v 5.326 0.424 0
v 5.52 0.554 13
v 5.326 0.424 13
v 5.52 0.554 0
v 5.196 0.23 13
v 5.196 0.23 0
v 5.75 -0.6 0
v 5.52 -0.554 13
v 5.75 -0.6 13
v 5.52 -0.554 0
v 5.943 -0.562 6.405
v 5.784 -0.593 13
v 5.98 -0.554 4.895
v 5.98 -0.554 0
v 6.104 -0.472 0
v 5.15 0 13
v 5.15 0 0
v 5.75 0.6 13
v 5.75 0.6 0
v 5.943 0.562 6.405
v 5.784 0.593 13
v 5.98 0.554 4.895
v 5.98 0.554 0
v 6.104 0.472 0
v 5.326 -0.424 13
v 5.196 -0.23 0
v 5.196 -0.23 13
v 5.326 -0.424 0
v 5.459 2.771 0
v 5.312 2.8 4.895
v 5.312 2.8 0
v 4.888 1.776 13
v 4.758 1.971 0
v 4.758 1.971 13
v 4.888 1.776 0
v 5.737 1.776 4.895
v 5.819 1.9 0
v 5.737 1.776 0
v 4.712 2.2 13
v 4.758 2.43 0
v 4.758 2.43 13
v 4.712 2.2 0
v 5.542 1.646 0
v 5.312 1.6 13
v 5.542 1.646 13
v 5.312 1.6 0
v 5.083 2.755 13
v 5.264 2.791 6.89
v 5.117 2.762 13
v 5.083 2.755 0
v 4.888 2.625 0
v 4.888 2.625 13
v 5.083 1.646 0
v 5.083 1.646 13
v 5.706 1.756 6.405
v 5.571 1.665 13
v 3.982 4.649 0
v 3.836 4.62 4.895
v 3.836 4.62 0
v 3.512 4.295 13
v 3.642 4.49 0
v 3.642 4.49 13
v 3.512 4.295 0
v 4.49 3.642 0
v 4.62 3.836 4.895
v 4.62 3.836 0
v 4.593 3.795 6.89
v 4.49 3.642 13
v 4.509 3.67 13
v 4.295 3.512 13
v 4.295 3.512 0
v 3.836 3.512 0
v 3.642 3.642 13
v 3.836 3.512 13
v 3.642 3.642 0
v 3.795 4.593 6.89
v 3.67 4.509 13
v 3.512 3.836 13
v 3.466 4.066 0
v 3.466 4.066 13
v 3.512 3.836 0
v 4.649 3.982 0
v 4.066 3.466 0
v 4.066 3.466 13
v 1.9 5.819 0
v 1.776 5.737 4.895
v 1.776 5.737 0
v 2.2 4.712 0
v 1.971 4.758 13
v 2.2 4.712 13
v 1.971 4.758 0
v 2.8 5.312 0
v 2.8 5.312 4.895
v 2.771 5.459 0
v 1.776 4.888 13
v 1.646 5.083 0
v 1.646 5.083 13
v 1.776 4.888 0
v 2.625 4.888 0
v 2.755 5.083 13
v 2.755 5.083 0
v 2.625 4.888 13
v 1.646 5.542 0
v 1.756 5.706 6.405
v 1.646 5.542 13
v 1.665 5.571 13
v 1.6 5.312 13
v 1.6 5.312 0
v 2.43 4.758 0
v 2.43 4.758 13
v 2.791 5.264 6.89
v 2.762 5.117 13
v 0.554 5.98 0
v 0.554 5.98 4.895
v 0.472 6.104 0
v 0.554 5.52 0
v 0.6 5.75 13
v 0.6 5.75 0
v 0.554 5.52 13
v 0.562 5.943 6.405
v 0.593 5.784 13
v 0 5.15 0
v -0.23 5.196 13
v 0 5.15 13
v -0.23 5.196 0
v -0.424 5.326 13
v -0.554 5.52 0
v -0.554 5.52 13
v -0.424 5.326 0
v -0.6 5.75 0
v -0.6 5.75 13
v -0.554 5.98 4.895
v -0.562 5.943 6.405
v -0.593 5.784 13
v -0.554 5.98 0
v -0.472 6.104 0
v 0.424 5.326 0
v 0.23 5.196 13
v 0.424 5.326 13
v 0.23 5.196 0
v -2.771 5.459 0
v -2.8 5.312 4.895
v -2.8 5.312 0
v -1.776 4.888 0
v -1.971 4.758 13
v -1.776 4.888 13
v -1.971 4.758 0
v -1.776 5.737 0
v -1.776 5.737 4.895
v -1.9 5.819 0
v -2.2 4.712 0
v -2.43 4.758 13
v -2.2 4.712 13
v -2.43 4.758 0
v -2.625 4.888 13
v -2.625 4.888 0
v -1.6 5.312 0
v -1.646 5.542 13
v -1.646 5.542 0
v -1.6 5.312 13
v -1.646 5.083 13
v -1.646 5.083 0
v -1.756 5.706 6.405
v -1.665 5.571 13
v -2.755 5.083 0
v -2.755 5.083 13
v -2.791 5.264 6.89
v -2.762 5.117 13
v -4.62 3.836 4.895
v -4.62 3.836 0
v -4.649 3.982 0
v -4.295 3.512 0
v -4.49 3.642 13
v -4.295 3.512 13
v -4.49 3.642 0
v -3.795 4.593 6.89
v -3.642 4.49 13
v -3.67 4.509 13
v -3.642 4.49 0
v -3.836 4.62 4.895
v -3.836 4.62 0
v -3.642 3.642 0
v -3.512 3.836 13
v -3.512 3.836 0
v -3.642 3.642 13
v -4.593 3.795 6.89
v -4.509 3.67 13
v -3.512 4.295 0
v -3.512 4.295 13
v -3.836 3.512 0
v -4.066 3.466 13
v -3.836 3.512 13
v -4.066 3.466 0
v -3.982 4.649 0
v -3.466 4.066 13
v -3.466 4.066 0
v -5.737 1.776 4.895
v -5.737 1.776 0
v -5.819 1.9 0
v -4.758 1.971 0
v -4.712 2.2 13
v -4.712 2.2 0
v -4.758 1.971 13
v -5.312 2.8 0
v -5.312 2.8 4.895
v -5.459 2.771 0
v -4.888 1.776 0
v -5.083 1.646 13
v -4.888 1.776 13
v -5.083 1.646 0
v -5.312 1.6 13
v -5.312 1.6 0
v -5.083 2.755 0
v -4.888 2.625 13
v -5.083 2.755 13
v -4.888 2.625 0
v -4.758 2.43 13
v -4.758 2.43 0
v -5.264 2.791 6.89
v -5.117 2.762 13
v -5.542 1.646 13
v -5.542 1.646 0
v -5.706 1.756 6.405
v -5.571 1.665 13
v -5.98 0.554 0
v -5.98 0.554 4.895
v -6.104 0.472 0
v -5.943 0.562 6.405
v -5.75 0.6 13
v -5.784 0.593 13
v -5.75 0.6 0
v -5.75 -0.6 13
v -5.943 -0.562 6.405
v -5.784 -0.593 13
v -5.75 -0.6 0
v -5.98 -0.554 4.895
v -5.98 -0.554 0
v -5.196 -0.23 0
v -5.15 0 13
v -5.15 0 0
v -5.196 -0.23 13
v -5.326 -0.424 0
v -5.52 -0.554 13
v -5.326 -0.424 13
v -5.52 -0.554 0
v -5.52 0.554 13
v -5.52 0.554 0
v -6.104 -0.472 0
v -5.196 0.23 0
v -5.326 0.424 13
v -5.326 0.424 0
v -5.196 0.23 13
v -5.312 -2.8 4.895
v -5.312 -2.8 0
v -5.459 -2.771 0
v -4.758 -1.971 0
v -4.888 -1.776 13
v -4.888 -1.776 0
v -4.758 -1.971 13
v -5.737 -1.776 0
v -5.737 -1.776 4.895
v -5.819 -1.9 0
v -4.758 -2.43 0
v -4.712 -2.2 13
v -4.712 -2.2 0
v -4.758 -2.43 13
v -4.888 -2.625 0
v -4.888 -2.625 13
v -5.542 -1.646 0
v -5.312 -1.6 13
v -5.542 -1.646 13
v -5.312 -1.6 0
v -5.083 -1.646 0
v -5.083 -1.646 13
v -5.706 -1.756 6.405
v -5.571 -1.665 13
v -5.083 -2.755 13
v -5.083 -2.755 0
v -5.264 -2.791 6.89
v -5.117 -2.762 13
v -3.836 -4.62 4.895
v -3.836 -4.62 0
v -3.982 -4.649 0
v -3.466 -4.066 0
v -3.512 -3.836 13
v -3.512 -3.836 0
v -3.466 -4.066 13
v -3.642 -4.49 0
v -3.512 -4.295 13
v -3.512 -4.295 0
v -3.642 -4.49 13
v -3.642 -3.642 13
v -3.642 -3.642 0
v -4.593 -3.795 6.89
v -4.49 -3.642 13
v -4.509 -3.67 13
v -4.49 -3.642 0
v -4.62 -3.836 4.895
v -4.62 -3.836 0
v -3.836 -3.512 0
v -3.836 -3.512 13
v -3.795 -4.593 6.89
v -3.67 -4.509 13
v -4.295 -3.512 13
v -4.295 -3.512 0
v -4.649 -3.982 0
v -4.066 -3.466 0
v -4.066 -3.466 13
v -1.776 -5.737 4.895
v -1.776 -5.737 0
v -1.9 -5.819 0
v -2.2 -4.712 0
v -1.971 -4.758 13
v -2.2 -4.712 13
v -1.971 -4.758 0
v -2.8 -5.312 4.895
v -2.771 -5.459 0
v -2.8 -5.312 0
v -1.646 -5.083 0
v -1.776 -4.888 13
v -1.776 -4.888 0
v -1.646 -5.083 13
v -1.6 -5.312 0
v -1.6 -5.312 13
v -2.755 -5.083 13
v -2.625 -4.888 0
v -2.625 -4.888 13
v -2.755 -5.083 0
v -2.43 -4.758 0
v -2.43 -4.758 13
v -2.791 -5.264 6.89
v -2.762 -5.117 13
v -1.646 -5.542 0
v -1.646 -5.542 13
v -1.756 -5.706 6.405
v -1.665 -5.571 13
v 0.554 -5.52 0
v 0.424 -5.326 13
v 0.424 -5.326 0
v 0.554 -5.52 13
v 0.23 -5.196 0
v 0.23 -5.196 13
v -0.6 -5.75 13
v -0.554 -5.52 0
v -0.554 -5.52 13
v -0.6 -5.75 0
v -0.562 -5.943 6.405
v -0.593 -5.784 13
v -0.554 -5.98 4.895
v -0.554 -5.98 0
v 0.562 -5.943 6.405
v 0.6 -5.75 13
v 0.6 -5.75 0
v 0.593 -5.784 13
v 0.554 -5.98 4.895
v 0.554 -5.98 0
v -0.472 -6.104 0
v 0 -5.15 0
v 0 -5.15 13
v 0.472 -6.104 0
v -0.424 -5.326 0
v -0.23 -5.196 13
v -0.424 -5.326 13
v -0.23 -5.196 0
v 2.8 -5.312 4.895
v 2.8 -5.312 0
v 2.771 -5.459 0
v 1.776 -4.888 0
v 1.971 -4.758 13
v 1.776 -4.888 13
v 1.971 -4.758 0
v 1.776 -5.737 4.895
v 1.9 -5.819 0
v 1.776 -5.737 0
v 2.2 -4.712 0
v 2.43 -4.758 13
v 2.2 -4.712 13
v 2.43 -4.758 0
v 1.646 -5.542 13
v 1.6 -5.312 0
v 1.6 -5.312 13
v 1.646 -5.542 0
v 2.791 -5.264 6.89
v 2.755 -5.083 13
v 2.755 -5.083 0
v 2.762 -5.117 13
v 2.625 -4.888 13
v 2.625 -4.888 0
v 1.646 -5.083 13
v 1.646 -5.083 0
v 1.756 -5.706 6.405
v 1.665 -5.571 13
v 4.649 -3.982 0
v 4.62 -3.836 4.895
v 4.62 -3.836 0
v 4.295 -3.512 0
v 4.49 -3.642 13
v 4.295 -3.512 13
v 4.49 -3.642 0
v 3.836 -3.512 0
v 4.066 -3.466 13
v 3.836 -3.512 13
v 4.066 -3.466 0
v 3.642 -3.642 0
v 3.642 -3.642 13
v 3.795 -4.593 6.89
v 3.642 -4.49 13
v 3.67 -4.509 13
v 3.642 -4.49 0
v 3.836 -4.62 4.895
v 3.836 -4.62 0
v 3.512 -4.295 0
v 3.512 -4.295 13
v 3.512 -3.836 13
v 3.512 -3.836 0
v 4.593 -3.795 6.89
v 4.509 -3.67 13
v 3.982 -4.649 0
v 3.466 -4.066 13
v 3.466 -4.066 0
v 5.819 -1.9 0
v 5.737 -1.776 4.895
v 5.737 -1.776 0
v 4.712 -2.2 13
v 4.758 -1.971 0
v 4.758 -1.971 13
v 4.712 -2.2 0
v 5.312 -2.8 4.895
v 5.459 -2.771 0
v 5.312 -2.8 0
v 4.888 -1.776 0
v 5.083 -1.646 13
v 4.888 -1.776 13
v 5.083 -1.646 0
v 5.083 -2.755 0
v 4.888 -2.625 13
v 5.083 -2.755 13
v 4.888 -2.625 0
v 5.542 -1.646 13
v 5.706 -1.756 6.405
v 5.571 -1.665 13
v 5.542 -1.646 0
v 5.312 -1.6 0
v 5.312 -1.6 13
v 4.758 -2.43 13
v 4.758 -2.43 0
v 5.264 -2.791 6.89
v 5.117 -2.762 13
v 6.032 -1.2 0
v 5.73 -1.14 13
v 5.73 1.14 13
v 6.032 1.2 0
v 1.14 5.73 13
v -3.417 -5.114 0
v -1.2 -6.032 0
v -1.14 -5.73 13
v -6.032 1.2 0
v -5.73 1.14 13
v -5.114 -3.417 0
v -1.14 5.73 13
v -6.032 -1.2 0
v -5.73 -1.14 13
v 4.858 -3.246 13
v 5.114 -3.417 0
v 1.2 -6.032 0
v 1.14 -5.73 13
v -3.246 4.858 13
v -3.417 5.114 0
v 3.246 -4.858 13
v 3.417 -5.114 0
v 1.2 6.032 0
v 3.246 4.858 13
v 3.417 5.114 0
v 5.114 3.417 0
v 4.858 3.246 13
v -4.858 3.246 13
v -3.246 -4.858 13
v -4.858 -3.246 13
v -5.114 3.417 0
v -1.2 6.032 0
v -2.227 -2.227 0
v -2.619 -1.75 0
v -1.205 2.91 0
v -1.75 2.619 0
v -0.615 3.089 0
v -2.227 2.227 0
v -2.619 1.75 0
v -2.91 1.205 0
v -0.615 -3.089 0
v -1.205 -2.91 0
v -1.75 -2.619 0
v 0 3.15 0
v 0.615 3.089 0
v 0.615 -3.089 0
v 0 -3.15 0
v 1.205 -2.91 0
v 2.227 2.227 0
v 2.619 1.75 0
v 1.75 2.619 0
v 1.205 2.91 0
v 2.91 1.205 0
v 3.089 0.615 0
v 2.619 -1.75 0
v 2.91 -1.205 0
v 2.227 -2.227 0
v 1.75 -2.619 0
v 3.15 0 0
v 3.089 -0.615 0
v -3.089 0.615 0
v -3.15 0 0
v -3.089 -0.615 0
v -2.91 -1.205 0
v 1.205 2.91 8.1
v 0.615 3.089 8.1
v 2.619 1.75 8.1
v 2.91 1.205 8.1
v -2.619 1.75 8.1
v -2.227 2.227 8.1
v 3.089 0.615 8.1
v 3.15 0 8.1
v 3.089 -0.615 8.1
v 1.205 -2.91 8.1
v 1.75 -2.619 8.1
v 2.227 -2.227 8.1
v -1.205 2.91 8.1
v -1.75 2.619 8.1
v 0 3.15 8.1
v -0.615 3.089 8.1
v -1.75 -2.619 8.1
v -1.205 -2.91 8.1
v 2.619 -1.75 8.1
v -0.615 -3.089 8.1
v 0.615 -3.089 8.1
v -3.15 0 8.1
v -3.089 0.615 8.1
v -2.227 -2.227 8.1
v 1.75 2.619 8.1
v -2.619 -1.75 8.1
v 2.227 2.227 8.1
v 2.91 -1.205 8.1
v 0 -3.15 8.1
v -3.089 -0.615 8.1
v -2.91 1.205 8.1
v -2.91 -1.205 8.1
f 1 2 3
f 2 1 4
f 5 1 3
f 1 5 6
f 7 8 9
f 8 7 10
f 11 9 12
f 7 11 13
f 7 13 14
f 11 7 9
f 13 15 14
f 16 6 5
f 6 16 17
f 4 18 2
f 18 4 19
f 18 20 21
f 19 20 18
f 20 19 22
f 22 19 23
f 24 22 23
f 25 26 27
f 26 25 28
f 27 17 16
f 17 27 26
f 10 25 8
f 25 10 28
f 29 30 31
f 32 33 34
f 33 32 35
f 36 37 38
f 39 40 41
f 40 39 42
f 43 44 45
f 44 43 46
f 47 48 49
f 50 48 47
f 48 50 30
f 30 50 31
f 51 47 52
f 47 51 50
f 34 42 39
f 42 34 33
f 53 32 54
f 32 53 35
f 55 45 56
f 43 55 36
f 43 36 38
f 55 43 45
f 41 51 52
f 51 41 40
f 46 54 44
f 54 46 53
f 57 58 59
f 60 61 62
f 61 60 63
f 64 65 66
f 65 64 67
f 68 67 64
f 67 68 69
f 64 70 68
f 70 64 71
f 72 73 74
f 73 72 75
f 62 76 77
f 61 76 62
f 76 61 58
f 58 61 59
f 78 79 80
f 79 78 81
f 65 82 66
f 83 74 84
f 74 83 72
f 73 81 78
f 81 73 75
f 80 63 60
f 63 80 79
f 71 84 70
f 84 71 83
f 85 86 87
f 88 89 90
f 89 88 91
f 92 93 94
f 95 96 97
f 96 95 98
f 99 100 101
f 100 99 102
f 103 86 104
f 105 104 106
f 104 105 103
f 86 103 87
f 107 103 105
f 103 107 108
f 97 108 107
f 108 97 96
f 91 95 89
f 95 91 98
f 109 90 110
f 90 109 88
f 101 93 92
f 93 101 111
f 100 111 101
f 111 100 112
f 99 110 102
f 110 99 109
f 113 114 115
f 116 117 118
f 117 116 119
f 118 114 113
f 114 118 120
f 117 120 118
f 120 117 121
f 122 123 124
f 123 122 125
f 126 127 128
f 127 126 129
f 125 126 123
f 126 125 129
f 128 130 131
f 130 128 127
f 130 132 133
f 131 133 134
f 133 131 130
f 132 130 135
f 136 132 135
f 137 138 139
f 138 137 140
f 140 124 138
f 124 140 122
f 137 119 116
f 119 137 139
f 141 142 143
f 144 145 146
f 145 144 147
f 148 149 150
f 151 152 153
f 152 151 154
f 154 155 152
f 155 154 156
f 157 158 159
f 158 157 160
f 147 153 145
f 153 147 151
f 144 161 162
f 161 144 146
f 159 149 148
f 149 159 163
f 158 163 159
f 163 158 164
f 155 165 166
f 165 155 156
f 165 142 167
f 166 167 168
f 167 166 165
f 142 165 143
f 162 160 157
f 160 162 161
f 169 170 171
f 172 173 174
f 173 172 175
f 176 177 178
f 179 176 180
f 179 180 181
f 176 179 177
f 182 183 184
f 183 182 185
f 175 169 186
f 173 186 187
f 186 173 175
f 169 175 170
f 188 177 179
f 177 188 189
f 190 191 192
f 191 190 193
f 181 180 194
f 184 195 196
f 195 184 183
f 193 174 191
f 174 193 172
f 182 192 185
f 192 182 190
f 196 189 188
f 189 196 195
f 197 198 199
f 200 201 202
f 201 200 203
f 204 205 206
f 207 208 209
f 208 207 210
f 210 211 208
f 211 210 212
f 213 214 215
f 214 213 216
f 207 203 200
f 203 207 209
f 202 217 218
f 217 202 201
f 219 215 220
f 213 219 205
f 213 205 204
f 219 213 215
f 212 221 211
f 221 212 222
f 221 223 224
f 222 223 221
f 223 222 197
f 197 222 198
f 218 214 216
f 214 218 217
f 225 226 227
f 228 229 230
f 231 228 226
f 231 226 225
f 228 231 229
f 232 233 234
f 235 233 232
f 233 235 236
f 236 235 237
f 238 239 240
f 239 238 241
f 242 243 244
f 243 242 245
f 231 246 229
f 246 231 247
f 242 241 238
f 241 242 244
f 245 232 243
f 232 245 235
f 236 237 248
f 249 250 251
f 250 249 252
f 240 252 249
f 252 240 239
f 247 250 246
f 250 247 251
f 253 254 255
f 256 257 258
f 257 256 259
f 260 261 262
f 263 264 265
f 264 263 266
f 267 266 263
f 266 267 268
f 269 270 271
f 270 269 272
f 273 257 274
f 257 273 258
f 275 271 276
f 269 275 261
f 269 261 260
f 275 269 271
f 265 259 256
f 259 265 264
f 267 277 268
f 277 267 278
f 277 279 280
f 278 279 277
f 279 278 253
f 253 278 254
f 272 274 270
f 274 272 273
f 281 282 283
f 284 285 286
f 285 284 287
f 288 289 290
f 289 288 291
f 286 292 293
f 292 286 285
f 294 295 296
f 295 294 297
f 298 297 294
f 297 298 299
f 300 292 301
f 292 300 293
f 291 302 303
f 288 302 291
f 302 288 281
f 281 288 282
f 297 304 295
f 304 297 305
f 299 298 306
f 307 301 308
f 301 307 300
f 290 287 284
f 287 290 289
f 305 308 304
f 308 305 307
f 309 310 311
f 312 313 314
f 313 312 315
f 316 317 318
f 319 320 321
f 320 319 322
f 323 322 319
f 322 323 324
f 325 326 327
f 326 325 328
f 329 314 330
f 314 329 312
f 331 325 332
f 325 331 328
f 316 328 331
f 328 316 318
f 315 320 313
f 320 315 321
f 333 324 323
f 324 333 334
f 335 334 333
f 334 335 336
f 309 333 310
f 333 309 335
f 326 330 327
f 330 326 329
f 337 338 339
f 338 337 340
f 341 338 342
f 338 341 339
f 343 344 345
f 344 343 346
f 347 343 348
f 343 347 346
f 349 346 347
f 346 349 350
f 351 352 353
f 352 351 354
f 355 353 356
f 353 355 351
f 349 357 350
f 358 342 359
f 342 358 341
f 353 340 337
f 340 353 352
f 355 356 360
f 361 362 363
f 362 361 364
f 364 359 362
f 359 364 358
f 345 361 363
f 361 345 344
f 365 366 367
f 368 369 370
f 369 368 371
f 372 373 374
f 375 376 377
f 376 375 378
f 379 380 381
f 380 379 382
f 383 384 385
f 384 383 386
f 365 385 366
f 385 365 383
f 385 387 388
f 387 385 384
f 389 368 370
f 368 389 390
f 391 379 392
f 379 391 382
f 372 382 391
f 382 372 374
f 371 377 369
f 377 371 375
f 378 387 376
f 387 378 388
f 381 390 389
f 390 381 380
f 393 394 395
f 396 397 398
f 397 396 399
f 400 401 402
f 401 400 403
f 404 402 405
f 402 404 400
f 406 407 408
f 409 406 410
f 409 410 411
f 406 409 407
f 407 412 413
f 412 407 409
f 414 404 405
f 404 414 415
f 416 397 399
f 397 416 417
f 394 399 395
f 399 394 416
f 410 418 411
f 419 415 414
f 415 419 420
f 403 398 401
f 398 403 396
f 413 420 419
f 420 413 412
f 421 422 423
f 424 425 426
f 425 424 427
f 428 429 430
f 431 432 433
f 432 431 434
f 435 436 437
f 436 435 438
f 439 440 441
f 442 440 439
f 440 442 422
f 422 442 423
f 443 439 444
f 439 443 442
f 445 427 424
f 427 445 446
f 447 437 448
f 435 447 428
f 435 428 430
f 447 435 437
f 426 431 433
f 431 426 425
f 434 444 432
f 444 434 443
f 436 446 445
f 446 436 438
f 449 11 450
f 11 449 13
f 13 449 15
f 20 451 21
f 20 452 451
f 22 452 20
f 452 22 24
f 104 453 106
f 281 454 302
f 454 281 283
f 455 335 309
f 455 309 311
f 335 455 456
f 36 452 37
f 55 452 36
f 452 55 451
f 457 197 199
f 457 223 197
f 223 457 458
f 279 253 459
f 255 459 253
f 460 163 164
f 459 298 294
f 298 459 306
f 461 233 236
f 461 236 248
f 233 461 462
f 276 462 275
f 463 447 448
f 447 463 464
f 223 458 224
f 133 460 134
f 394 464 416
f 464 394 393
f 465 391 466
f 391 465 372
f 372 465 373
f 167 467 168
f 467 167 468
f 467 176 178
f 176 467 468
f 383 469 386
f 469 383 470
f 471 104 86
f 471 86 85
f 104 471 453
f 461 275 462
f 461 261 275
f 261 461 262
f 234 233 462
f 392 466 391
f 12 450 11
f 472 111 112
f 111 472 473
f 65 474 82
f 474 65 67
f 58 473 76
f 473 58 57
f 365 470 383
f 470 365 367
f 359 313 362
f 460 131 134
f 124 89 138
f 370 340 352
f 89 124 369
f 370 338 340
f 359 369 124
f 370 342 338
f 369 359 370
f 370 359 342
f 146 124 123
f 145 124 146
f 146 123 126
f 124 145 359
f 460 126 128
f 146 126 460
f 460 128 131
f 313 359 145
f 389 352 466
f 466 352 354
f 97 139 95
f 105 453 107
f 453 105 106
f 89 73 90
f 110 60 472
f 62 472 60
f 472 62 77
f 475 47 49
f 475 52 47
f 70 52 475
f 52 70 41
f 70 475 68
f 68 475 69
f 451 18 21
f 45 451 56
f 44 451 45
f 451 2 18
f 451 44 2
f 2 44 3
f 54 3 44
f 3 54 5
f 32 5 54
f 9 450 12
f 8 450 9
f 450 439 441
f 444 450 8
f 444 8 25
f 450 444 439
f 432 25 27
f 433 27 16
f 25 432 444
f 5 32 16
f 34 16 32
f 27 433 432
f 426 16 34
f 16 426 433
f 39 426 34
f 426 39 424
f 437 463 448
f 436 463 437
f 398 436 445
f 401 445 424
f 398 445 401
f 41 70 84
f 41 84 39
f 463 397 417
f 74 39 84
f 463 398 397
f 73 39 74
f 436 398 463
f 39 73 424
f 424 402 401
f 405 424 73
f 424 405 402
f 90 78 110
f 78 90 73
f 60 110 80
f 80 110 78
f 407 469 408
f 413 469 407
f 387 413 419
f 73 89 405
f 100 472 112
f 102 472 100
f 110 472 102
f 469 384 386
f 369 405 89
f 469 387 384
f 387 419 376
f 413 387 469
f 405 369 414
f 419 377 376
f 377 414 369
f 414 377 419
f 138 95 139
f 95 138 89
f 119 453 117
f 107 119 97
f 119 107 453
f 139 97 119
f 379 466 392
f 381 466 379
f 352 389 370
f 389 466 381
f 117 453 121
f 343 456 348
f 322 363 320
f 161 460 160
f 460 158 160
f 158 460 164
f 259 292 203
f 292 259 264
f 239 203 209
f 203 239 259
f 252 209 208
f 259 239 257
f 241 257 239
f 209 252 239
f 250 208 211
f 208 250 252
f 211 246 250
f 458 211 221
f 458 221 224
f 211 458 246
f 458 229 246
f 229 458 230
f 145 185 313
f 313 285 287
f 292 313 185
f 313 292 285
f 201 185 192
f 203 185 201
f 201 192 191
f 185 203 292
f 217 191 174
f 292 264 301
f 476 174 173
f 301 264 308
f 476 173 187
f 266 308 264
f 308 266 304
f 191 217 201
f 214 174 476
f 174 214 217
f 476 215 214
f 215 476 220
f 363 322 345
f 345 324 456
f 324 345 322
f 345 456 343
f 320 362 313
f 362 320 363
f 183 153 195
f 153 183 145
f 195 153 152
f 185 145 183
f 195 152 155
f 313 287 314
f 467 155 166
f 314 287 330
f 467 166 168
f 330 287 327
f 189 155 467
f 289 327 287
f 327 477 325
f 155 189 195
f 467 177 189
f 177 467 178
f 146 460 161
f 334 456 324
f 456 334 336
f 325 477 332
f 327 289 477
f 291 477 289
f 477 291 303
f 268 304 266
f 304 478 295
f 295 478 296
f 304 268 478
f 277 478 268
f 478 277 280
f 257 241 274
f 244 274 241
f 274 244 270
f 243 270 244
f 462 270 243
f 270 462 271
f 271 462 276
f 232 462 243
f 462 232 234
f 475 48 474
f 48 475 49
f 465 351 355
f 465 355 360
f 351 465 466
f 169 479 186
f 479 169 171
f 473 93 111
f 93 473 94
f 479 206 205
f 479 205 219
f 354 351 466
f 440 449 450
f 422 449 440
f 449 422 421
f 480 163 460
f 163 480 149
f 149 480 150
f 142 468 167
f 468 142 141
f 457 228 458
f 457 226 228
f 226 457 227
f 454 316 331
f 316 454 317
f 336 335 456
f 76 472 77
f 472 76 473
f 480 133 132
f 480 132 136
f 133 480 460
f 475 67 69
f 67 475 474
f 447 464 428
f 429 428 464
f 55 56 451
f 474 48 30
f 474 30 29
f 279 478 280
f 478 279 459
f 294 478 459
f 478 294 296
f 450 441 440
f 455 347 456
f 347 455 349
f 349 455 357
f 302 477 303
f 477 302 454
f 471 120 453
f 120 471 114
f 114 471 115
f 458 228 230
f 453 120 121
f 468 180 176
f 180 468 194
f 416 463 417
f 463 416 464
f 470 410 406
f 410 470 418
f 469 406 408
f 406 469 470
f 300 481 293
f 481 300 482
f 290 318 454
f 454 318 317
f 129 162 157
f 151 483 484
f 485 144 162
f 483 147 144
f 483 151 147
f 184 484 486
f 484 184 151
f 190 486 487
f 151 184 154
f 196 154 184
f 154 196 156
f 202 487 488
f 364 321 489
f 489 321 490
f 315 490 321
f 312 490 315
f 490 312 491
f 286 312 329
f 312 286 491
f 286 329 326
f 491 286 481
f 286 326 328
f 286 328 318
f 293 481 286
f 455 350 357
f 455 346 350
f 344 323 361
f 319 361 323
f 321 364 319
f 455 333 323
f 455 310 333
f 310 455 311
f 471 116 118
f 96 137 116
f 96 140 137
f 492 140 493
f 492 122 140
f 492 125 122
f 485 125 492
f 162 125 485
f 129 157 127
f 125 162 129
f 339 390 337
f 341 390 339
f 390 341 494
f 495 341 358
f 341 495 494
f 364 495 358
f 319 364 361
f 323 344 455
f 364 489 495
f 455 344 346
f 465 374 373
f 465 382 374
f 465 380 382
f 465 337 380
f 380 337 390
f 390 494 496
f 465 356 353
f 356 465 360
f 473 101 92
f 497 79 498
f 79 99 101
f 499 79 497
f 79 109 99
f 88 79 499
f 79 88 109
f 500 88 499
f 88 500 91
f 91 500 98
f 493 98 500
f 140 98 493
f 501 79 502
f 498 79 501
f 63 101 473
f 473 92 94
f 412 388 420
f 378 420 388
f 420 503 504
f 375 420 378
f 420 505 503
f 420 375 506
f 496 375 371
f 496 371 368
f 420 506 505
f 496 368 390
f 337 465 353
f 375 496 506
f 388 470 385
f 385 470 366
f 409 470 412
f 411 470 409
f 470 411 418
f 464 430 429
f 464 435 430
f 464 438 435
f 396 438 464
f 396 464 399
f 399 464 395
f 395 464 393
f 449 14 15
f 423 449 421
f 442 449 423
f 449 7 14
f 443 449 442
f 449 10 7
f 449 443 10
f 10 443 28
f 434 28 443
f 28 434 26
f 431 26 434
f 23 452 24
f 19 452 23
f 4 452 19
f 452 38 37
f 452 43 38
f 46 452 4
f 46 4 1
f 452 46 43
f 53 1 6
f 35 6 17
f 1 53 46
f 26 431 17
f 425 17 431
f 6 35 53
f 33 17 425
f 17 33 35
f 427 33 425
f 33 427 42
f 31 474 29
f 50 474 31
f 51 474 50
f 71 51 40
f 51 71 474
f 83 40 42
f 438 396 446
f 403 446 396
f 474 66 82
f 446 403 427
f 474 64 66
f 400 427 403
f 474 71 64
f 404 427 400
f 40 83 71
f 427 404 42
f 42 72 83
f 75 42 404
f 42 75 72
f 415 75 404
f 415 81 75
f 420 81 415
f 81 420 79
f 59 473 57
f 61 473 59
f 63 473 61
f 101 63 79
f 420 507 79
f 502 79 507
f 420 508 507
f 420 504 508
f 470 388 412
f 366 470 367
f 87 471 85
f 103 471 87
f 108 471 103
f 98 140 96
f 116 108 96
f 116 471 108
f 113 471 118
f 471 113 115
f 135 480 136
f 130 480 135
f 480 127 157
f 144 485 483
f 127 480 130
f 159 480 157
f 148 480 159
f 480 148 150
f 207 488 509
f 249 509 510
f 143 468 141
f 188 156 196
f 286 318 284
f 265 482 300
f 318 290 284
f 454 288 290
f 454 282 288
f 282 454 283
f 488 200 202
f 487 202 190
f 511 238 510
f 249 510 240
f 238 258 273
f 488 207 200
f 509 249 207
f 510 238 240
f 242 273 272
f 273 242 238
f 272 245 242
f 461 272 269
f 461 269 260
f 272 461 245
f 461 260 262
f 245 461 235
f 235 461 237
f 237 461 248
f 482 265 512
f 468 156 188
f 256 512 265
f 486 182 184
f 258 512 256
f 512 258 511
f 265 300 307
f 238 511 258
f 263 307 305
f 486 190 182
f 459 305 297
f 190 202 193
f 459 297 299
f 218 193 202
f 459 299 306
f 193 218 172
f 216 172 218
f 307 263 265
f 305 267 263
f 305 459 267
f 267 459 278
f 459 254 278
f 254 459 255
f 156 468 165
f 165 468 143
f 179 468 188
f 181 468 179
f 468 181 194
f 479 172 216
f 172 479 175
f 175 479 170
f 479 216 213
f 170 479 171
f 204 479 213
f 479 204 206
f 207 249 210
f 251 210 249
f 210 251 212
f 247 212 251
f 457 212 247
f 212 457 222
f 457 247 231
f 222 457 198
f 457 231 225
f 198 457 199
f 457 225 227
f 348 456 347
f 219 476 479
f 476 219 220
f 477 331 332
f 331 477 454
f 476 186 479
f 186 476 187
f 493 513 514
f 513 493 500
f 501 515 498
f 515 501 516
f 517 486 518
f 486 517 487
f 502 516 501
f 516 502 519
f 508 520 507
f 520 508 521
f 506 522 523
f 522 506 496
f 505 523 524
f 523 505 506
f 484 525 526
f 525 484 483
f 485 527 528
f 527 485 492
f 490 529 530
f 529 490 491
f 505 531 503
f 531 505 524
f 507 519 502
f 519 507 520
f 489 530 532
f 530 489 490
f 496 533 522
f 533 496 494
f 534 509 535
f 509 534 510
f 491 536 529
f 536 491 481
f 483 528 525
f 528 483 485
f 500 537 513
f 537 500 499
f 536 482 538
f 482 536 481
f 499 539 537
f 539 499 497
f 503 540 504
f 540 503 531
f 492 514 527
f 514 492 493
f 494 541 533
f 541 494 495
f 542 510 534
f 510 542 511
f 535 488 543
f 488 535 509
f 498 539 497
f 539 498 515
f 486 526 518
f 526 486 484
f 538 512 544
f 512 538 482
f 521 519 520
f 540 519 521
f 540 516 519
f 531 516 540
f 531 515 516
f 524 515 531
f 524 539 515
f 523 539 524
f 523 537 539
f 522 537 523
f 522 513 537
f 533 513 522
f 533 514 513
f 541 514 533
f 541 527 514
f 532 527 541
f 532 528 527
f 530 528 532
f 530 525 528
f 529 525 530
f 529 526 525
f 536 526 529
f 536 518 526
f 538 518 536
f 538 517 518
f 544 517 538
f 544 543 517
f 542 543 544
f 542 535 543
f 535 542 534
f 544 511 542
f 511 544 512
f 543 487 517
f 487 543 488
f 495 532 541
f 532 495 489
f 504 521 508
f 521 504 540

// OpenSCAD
// ACCESS KNOB — Elektron Machinedrum / Monomachine Master & Vol Knob
// Generated via CLI for Studio Knobs
module access_knob_elektron_master() {
  outer_d = 12.3;
  height = 13;
  taper = 0.95;
  bore_d = 6;
  slot_h = 8;
  tex_depth = 0.8;
  tex_scale = 1.2;
  tex_count = 16;

  difference() {
    cylinder(h=height, d1=outer_d, d2=outer_d*taper, $fn=32);
    translate([0,0,-0.1]) cylinder(h=slot_h+0.2, d=bore_d + 0.3, $fn=32);
    for(i=[0:tex_count-1]) {
      rotate([0,0,i*(360/tex_count)])
        translate([outer_d/2-tex_depth/2, 0, height/2])
          cylinder(h=height*1.1, d=tex_scale, center=true, $fn=16);
    }
  }
}
access_knob_elektron_master();
